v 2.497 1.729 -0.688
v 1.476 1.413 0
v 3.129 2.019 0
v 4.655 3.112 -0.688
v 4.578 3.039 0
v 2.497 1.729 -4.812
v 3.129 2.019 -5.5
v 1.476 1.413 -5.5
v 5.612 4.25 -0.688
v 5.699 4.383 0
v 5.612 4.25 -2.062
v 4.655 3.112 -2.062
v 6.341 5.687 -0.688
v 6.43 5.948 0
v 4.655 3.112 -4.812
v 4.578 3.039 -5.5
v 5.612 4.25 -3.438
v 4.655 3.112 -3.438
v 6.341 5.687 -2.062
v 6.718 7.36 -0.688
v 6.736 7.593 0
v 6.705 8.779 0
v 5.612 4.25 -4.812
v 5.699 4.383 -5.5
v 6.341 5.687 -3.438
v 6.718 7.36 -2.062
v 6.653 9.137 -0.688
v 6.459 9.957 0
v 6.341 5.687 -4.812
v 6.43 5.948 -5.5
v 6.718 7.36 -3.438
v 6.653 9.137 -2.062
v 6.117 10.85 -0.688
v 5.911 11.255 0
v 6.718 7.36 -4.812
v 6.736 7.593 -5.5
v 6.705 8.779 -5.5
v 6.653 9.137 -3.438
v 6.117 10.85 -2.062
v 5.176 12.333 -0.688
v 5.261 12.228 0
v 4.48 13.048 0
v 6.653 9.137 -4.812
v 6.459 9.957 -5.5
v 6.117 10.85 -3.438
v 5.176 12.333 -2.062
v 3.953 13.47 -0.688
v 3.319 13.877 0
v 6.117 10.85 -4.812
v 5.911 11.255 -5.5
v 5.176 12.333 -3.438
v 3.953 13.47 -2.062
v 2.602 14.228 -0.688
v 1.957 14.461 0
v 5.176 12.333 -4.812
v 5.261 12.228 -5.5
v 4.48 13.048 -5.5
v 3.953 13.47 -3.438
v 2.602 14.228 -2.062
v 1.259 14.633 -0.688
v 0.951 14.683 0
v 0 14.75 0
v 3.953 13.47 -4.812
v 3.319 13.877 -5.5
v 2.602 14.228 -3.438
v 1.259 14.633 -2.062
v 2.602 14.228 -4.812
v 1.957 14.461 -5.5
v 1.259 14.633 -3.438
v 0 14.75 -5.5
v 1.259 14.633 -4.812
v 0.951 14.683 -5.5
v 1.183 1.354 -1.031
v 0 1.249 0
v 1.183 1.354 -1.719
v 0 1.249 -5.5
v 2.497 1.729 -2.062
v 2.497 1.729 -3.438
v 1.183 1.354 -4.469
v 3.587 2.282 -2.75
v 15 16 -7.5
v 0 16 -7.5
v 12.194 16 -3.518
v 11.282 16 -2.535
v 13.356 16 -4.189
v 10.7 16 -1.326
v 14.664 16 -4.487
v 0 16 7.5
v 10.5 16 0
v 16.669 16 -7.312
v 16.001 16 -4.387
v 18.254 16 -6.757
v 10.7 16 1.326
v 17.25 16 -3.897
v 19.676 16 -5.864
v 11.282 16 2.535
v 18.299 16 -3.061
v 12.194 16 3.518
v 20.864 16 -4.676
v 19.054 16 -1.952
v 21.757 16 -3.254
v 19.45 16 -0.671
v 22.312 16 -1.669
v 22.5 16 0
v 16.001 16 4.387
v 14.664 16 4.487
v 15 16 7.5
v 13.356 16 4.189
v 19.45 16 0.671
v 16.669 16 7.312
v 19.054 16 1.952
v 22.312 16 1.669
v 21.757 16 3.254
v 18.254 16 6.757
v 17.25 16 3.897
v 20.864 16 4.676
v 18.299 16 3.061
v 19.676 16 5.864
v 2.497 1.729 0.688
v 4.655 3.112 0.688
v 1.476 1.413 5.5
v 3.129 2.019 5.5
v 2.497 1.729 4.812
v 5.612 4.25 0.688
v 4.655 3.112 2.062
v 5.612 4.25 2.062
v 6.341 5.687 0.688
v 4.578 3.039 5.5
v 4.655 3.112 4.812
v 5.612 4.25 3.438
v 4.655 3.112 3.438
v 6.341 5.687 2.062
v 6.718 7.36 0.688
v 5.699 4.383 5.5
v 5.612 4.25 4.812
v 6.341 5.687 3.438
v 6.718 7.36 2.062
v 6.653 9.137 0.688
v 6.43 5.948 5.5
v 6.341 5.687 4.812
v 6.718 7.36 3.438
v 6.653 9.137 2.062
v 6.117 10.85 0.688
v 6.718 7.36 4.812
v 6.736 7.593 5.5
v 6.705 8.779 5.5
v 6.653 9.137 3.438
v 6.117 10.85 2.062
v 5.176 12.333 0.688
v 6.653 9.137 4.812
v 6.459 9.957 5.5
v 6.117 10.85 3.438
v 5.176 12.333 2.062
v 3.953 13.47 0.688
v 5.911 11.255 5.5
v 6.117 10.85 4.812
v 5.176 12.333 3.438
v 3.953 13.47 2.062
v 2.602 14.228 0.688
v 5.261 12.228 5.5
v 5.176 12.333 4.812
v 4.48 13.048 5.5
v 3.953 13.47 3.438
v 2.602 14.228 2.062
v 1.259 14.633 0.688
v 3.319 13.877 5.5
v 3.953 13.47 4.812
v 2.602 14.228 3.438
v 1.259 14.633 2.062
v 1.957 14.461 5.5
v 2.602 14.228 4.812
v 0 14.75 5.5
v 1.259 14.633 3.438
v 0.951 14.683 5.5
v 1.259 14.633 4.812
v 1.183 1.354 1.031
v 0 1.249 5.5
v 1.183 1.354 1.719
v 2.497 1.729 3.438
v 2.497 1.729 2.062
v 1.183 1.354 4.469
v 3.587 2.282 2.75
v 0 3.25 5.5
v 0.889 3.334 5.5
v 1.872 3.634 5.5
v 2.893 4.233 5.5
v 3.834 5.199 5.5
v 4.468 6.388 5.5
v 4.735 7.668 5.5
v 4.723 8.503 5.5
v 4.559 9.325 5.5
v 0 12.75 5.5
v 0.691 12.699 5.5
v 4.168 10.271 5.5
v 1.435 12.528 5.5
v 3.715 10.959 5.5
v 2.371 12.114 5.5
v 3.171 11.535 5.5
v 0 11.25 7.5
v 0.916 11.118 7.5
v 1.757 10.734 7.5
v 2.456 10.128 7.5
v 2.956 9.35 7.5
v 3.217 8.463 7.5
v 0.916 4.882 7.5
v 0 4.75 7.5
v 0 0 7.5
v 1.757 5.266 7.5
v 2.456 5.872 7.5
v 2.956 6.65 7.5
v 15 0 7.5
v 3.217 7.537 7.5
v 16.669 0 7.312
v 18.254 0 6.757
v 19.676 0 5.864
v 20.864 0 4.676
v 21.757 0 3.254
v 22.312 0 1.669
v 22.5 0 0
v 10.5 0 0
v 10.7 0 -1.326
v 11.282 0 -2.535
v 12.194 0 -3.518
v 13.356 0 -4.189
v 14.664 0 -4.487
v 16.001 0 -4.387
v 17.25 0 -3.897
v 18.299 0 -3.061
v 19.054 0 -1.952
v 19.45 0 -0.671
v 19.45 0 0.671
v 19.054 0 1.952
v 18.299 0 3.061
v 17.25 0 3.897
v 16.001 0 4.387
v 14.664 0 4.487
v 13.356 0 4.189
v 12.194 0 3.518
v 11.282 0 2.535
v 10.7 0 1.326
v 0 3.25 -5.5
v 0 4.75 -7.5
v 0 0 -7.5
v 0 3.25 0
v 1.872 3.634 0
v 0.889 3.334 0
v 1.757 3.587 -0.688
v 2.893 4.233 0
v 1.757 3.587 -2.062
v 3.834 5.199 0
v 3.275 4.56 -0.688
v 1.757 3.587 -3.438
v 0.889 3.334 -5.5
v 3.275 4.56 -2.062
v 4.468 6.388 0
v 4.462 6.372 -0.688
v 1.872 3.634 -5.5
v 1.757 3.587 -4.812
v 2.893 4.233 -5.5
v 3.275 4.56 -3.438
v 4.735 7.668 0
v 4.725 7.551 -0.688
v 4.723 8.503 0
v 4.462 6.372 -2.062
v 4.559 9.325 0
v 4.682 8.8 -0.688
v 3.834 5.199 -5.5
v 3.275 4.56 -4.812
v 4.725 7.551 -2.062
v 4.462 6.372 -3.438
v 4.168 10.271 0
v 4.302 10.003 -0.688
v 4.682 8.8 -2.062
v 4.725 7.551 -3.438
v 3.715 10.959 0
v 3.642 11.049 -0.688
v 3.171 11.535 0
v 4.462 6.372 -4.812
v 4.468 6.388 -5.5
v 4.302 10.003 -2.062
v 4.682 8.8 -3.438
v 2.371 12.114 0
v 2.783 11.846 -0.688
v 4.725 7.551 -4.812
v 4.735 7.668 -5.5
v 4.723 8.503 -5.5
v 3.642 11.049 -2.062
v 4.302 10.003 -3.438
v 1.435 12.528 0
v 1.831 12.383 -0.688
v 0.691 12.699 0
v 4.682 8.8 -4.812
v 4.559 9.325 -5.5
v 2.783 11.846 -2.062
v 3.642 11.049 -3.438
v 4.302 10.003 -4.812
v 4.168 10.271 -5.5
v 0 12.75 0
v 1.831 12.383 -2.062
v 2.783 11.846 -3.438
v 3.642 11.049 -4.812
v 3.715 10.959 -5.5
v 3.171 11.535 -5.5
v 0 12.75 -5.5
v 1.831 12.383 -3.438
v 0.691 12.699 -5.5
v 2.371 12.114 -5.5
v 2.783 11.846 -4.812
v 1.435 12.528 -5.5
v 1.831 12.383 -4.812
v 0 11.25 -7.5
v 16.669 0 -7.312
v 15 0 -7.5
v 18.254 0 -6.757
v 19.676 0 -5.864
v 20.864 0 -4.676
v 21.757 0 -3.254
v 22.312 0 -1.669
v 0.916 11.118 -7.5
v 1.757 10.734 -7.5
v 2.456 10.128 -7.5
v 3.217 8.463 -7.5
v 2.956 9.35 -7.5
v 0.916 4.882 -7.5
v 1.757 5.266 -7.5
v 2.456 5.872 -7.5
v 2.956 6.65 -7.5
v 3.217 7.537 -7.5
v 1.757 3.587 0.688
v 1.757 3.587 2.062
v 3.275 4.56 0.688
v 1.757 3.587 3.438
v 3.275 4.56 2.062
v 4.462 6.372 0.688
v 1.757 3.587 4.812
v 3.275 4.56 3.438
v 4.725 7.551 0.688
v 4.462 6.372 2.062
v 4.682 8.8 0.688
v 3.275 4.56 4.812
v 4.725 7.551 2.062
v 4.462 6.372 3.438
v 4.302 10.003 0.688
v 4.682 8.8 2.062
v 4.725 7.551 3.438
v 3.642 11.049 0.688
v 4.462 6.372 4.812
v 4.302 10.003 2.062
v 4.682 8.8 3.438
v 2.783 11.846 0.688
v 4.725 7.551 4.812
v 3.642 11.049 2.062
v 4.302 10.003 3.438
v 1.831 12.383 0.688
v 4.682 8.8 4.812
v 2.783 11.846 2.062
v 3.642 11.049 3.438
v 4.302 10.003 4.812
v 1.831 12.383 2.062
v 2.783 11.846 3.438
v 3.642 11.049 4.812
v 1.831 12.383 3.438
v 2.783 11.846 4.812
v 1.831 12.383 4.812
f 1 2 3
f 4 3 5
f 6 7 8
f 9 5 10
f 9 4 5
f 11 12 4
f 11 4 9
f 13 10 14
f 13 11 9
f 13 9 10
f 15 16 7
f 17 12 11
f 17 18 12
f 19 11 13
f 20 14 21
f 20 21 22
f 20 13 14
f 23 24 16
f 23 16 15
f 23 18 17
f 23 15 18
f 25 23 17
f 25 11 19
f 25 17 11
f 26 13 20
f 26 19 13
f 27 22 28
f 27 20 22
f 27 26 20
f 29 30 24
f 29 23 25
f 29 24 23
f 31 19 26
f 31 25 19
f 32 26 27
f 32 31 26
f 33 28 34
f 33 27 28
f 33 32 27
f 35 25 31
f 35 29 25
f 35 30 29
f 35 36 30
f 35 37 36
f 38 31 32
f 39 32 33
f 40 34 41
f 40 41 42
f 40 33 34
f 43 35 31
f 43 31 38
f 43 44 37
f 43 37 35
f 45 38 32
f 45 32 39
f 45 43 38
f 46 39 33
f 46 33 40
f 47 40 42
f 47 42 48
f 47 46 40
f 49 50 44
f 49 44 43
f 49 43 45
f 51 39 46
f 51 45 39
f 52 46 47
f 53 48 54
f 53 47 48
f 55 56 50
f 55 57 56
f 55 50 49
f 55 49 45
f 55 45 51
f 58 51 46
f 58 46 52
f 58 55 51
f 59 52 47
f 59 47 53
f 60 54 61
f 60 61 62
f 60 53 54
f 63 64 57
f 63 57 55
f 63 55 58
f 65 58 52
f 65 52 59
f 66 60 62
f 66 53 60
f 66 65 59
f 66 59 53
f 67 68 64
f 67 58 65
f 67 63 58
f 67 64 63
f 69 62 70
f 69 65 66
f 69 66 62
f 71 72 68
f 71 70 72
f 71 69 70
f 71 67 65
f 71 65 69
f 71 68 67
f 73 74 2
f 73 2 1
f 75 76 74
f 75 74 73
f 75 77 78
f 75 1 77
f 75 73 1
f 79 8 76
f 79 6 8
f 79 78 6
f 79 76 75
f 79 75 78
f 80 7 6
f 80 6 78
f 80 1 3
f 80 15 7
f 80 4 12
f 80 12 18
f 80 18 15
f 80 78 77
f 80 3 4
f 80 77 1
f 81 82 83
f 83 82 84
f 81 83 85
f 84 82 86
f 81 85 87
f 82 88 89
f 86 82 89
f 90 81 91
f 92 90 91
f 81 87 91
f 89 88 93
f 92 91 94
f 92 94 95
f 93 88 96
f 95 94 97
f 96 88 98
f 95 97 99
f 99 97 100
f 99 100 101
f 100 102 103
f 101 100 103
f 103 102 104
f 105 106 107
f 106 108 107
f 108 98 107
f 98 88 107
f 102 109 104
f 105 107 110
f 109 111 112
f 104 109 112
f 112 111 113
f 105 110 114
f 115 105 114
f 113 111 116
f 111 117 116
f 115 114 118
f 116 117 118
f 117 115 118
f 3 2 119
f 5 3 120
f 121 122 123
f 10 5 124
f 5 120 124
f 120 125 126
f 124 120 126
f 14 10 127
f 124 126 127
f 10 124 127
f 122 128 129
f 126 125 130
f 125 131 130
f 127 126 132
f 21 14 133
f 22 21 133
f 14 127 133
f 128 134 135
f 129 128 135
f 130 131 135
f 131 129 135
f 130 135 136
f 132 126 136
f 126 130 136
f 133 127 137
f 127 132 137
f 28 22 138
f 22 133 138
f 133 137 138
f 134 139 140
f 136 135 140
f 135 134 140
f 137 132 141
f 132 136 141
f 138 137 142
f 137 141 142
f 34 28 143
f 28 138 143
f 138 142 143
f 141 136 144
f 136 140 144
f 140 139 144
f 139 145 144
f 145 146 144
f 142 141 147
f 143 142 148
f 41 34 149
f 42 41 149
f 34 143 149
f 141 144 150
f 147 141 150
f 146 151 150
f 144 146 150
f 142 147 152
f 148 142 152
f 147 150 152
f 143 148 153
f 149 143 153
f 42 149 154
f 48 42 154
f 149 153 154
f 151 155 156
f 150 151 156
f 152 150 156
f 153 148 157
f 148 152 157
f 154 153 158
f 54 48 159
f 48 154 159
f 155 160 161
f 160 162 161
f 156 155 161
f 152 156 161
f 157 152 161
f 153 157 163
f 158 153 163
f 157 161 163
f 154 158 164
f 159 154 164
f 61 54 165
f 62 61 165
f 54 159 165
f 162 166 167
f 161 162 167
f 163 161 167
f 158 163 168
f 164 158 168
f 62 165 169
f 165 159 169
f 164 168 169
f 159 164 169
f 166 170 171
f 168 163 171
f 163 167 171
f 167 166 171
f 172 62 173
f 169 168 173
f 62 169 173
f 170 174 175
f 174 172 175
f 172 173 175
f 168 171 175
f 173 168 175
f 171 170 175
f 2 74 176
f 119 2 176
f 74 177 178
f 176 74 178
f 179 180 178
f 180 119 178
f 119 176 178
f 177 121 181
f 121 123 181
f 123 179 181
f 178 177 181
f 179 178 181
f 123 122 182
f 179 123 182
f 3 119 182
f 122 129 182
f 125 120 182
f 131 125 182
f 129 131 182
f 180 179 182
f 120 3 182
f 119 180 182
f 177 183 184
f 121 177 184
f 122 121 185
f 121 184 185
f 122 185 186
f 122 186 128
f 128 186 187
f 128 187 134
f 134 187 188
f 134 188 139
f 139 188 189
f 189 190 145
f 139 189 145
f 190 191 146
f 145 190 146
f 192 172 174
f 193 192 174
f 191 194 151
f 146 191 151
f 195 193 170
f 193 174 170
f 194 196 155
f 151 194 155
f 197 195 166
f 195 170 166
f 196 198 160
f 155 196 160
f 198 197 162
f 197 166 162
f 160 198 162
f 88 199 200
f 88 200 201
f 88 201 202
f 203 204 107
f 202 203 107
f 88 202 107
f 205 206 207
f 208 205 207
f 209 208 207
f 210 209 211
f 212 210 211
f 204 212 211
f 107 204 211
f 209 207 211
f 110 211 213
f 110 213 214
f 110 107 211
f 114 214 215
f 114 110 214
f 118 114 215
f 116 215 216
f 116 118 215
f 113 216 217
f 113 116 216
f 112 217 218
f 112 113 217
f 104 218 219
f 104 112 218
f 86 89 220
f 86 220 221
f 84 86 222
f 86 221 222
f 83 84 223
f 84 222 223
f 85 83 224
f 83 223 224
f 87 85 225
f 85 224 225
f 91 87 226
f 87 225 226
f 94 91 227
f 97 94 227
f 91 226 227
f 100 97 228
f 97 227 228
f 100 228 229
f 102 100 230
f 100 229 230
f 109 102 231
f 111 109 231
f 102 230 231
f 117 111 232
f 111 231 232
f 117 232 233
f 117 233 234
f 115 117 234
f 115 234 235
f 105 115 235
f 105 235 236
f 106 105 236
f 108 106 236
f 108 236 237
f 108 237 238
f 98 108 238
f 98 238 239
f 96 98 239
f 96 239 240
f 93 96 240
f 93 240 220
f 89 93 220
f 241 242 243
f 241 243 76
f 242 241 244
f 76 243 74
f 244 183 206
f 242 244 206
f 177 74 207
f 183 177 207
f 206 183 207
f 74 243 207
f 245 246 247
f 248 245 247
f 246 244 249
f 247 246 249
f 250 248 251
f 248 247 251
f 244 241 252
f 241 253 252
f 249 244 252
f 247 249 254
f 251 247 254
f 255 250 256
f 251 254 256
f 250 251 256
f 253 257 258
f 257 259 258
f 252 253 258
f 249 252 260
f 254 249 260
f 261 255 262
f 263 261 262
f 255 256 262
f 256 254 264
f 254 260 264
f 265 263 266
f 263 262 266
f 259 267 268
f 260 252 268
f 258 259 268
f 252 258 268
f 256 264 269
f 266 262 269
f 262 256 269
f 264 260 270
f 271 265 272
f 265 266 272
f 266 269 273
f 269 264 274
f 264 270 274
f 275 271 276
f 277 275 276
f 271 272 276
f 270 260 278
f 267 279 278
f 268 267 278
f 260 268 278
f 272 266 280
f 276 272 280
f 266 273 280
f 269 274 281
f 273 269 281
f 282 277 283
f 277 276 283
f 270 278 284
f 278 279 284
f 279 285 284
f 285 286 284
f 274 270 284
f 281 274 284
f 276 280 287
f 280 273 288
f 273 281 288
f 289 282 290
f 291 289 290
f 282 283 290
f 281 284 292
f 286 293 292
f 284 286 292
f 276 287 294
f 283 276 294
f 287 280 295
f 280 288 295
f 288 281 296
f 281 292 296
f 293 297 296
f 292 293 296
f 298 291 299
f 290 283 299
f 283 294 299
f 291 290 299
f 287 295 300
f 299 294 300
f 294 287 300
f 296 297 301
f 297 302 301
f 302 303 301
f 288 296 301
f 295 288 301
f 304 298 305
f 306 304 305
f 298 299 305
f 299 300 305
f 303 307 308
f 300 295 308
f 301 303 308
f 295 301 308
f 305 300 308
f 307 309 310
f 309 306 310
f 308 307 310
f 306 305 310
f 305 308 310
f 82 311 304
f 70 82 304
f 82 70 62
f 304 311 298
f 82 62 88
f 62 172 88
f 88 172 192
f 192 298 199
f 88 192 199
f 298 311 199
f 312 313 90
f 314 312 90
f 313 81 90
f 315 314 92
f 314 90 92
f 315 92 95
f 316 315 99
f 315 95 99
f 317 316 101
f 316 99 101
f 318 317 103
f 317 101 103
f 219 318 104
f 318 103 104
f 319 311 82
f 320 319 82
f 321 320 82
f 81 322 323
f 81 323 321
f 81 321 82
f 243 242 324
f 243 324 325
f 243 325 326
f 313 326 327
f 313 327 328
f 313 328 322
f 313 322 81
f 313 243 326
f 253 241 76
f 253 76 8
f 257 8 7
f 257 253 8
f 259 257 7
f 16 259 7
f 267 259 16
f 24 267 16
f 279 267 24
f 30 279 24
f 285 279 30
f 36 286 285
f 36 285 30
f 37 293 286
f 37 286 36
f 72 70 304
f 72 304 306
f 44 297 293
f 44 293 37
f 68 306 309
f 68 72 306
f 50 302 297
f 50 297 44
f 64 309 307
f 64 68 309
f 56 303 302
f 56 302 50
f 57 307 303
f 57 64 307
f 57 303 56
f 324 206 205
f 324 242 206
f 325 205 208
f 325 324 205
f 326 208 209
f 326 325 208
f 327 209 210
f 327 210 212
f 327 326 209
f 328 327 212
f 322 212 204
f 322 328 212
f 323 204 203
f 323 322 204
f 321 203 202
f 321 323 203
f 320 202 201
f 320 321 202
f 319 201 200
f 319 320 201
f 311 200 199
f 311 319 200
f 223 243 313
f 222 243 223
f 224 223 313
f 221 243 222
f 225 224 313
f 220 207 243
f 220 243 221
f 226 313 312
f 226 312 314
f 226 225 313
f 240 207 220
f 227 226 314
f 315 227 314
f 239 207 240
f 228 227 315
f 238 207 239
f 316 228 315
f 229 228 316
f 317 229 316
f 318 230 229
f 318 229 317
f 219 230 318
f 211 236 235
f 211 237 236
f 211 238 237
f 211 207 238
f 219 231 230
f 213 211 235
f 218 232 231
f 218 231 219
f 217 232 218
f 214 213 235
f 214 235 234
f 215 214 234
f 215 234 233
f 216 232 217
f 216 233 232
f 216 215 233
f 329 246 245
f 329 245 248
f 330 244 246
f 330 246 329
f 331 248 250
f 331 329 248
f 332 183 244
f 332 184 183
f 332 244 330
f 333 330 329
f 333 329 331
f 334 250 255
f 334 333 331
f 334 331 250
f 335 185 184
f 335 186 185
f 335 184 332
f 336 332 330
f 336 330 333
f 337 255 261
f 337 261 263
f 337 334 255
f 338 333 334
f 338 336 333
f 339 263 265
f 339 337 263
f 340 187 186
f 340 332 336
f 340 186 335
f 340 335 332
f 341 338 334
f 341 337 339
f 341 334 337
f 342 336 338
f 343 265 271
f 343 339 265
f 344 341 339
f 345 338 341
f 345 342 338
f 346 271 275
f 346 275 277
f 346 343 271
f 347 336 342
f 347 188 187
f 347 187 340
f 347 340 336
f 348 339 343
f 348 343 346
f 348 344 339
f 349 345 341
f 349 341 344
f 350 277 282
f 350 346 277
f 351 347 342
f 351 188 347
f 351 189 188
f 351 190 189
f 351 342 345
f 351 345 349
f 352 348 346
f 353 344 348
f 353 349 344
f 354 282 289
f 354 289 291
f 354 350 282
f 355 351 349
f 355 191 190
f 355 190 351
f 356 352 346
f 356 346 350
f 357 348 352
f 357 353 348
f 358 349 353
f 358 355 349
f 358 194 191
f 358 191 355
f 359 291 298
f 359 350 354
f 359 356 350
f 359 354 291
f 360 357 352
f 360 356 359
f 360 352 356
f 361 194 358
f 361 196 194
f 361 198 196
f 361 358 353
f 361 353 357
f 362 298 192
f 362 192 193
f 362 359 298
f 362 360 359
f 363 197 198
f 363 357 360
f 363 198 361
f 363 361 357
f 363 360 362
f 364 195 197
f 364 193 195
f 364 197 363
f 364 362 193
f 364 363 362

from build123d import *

# Parameters (mm, degrees)
SKETCH1_W            = 22.5
SKETCH1_H            = 7.5
BOSS_EXTRUDE1_DEPTH  = 16
SKETCH2_R            = 3.25
CUT_EXTRUDE1_DEPTH   = 29.609439002
CUT_SWEEP1_START     = -5.5
CUT_SWEEP1_DEPTH     = 5.5
M8_CLEARANCE_HOLE1_D = 9
FILLET1_R            = 7.5


# Read off the part's stored shape, not the designer's step: Cut-Sweep1
with BuildPart() as part:
    # Sketch1 → Boss-Extrude1 (new body)
    with BuildSketch(Plane(origin=(0, 0, 0), x_dir=(1, 0, 0), z_dir=(0, 1, 0))):
        with Locations((11.25, 3.75)):
            Rectangle(SKETCH1_W, SKETCH1_H)
    extrude(amount=BOSS_EXTRUDE1_DEPTH)

    # Sketch2 → Cut-Extrude1 (cut, through all)
    with BuildSketch(Plane.XY):
        with Locations((0, 8)):
            Circle(SKETCH2_R)
    extrude(amount=-CUT_EXTRUDE1_DEPTH, mode=Mode.SUBTRACT)

    # Cut-Sweep1 outline → Cut-Sweep1 (cut)
    with BuildSketch(Plane.XY.offset(CUT_SWEEP1_START)):
        with BuildLine():
            Line((0, 3.249930627), (0, 1.249434771))
            add(Edge.make_bspline(
                [(0, 1.249434771), (0.149995203, 1.25004033), (0.30688463, 1.254968997), (1.093425095, 1.310005949), (1.780407601, 1.443456641), (3.214381438, 2.014530663), (3.966417034, 2.456250234), (5.342873723, 3.766883929), (5.956791785, 4.632955322), (6.725554437, 6.74015649), (6.857452883, 7.944240799), (6.449506923, 10.330582428), (5.919057461, 11.44506695), (4.432172795, 13.221075917), (3.517243631, 13.845944042), (1.687026948, 14.610603142), (0.802645598, 14.750006388), (0, 14.75)],
                knots=[0.087190704, 0.087190704, 0.087190704, 0.087190704, 0.118471805, 0.118471805, 0.23694361, 0.23694361, 0.355415415, 0.355415415, 0.47388722, 0.47388722, 0.592359026, 0.592359026, 0.710830831, 0.710830831, 0.829302636, 0.829302636, 0.947774441, 0.947774441, 0.947774441, 0.947774441], degree=3))
            Line((0, 14.75), (0, 12.75))
            add(Edge.make_bspline(
                [(0, 3.249930627), (0.109137324, 3.250243145), (0.218715414, 3.253689733), (0.769523599, 3.292231999), (1.251212609, 3.385472533), (2.263638937, 3.788666681), (2.793426306, 4.100980011), (3.757556078, 5.019003289), (4.195566344, 5.640878482), (4.729047664, 7.103163163), (4.82290714, 7.976601279), (4.54124976, 9.62420025), (4.15661699, 10.434633992), (3.127582079, 11.66376284), (2.470103133, 12.115899669), (1.192161348, 12.64981872), (0.547543704, 12.750002903), (0, 12.75)],
                knots=[0.087942654, 0.087942654, 0.087942654, 0.087942654, 0.118471805, 0.118471805, 0.23694361, 0.23694361, 0.355415415, 0.355415415, 0.47388722, 0.47388722, 0.592359026, 0.592359026, 0.710830831, 0.710830831, 0.829302636, 0.829302636, 0.947774441, 0.947774441, 0.947774441, 0.947774441], degree=3))
        make_face()
    extrude(amount=CUT_SWEEP1_DEPTH, mode=Mode.SUBTRACT)

    # Mirror1: part across plane


with BuildPart() as part_1:
    add(part.part)
    add(part.part.mirror(Plane(origin=(0, 16, 0), x_dir=(1, 0, 0), z_dir=(0, 0, -1))))

    # M8 Clearance Hole1 (through all)
    with Locations(Plane(origin=(0, 16, 0), x_dir=(1, 0, 0), z_dir=(0, 1, 0))):
        with Locations((15, 0)):
            Hole(M8_CLEARANCE_HOLE1_D / 2)

    # Fillet1
    fillet1_edges = [part_1.edges().sort_by_distance(p)[0] for p in [
        (22.5, 8, -7.5),
        (22.5, 8, 7.5),
    ]]
    fillet(fillet1_edges, radius=FILLET1_R - 0.0001)  # a hair under: the kernel refuses the full size


solid = part_1.part
